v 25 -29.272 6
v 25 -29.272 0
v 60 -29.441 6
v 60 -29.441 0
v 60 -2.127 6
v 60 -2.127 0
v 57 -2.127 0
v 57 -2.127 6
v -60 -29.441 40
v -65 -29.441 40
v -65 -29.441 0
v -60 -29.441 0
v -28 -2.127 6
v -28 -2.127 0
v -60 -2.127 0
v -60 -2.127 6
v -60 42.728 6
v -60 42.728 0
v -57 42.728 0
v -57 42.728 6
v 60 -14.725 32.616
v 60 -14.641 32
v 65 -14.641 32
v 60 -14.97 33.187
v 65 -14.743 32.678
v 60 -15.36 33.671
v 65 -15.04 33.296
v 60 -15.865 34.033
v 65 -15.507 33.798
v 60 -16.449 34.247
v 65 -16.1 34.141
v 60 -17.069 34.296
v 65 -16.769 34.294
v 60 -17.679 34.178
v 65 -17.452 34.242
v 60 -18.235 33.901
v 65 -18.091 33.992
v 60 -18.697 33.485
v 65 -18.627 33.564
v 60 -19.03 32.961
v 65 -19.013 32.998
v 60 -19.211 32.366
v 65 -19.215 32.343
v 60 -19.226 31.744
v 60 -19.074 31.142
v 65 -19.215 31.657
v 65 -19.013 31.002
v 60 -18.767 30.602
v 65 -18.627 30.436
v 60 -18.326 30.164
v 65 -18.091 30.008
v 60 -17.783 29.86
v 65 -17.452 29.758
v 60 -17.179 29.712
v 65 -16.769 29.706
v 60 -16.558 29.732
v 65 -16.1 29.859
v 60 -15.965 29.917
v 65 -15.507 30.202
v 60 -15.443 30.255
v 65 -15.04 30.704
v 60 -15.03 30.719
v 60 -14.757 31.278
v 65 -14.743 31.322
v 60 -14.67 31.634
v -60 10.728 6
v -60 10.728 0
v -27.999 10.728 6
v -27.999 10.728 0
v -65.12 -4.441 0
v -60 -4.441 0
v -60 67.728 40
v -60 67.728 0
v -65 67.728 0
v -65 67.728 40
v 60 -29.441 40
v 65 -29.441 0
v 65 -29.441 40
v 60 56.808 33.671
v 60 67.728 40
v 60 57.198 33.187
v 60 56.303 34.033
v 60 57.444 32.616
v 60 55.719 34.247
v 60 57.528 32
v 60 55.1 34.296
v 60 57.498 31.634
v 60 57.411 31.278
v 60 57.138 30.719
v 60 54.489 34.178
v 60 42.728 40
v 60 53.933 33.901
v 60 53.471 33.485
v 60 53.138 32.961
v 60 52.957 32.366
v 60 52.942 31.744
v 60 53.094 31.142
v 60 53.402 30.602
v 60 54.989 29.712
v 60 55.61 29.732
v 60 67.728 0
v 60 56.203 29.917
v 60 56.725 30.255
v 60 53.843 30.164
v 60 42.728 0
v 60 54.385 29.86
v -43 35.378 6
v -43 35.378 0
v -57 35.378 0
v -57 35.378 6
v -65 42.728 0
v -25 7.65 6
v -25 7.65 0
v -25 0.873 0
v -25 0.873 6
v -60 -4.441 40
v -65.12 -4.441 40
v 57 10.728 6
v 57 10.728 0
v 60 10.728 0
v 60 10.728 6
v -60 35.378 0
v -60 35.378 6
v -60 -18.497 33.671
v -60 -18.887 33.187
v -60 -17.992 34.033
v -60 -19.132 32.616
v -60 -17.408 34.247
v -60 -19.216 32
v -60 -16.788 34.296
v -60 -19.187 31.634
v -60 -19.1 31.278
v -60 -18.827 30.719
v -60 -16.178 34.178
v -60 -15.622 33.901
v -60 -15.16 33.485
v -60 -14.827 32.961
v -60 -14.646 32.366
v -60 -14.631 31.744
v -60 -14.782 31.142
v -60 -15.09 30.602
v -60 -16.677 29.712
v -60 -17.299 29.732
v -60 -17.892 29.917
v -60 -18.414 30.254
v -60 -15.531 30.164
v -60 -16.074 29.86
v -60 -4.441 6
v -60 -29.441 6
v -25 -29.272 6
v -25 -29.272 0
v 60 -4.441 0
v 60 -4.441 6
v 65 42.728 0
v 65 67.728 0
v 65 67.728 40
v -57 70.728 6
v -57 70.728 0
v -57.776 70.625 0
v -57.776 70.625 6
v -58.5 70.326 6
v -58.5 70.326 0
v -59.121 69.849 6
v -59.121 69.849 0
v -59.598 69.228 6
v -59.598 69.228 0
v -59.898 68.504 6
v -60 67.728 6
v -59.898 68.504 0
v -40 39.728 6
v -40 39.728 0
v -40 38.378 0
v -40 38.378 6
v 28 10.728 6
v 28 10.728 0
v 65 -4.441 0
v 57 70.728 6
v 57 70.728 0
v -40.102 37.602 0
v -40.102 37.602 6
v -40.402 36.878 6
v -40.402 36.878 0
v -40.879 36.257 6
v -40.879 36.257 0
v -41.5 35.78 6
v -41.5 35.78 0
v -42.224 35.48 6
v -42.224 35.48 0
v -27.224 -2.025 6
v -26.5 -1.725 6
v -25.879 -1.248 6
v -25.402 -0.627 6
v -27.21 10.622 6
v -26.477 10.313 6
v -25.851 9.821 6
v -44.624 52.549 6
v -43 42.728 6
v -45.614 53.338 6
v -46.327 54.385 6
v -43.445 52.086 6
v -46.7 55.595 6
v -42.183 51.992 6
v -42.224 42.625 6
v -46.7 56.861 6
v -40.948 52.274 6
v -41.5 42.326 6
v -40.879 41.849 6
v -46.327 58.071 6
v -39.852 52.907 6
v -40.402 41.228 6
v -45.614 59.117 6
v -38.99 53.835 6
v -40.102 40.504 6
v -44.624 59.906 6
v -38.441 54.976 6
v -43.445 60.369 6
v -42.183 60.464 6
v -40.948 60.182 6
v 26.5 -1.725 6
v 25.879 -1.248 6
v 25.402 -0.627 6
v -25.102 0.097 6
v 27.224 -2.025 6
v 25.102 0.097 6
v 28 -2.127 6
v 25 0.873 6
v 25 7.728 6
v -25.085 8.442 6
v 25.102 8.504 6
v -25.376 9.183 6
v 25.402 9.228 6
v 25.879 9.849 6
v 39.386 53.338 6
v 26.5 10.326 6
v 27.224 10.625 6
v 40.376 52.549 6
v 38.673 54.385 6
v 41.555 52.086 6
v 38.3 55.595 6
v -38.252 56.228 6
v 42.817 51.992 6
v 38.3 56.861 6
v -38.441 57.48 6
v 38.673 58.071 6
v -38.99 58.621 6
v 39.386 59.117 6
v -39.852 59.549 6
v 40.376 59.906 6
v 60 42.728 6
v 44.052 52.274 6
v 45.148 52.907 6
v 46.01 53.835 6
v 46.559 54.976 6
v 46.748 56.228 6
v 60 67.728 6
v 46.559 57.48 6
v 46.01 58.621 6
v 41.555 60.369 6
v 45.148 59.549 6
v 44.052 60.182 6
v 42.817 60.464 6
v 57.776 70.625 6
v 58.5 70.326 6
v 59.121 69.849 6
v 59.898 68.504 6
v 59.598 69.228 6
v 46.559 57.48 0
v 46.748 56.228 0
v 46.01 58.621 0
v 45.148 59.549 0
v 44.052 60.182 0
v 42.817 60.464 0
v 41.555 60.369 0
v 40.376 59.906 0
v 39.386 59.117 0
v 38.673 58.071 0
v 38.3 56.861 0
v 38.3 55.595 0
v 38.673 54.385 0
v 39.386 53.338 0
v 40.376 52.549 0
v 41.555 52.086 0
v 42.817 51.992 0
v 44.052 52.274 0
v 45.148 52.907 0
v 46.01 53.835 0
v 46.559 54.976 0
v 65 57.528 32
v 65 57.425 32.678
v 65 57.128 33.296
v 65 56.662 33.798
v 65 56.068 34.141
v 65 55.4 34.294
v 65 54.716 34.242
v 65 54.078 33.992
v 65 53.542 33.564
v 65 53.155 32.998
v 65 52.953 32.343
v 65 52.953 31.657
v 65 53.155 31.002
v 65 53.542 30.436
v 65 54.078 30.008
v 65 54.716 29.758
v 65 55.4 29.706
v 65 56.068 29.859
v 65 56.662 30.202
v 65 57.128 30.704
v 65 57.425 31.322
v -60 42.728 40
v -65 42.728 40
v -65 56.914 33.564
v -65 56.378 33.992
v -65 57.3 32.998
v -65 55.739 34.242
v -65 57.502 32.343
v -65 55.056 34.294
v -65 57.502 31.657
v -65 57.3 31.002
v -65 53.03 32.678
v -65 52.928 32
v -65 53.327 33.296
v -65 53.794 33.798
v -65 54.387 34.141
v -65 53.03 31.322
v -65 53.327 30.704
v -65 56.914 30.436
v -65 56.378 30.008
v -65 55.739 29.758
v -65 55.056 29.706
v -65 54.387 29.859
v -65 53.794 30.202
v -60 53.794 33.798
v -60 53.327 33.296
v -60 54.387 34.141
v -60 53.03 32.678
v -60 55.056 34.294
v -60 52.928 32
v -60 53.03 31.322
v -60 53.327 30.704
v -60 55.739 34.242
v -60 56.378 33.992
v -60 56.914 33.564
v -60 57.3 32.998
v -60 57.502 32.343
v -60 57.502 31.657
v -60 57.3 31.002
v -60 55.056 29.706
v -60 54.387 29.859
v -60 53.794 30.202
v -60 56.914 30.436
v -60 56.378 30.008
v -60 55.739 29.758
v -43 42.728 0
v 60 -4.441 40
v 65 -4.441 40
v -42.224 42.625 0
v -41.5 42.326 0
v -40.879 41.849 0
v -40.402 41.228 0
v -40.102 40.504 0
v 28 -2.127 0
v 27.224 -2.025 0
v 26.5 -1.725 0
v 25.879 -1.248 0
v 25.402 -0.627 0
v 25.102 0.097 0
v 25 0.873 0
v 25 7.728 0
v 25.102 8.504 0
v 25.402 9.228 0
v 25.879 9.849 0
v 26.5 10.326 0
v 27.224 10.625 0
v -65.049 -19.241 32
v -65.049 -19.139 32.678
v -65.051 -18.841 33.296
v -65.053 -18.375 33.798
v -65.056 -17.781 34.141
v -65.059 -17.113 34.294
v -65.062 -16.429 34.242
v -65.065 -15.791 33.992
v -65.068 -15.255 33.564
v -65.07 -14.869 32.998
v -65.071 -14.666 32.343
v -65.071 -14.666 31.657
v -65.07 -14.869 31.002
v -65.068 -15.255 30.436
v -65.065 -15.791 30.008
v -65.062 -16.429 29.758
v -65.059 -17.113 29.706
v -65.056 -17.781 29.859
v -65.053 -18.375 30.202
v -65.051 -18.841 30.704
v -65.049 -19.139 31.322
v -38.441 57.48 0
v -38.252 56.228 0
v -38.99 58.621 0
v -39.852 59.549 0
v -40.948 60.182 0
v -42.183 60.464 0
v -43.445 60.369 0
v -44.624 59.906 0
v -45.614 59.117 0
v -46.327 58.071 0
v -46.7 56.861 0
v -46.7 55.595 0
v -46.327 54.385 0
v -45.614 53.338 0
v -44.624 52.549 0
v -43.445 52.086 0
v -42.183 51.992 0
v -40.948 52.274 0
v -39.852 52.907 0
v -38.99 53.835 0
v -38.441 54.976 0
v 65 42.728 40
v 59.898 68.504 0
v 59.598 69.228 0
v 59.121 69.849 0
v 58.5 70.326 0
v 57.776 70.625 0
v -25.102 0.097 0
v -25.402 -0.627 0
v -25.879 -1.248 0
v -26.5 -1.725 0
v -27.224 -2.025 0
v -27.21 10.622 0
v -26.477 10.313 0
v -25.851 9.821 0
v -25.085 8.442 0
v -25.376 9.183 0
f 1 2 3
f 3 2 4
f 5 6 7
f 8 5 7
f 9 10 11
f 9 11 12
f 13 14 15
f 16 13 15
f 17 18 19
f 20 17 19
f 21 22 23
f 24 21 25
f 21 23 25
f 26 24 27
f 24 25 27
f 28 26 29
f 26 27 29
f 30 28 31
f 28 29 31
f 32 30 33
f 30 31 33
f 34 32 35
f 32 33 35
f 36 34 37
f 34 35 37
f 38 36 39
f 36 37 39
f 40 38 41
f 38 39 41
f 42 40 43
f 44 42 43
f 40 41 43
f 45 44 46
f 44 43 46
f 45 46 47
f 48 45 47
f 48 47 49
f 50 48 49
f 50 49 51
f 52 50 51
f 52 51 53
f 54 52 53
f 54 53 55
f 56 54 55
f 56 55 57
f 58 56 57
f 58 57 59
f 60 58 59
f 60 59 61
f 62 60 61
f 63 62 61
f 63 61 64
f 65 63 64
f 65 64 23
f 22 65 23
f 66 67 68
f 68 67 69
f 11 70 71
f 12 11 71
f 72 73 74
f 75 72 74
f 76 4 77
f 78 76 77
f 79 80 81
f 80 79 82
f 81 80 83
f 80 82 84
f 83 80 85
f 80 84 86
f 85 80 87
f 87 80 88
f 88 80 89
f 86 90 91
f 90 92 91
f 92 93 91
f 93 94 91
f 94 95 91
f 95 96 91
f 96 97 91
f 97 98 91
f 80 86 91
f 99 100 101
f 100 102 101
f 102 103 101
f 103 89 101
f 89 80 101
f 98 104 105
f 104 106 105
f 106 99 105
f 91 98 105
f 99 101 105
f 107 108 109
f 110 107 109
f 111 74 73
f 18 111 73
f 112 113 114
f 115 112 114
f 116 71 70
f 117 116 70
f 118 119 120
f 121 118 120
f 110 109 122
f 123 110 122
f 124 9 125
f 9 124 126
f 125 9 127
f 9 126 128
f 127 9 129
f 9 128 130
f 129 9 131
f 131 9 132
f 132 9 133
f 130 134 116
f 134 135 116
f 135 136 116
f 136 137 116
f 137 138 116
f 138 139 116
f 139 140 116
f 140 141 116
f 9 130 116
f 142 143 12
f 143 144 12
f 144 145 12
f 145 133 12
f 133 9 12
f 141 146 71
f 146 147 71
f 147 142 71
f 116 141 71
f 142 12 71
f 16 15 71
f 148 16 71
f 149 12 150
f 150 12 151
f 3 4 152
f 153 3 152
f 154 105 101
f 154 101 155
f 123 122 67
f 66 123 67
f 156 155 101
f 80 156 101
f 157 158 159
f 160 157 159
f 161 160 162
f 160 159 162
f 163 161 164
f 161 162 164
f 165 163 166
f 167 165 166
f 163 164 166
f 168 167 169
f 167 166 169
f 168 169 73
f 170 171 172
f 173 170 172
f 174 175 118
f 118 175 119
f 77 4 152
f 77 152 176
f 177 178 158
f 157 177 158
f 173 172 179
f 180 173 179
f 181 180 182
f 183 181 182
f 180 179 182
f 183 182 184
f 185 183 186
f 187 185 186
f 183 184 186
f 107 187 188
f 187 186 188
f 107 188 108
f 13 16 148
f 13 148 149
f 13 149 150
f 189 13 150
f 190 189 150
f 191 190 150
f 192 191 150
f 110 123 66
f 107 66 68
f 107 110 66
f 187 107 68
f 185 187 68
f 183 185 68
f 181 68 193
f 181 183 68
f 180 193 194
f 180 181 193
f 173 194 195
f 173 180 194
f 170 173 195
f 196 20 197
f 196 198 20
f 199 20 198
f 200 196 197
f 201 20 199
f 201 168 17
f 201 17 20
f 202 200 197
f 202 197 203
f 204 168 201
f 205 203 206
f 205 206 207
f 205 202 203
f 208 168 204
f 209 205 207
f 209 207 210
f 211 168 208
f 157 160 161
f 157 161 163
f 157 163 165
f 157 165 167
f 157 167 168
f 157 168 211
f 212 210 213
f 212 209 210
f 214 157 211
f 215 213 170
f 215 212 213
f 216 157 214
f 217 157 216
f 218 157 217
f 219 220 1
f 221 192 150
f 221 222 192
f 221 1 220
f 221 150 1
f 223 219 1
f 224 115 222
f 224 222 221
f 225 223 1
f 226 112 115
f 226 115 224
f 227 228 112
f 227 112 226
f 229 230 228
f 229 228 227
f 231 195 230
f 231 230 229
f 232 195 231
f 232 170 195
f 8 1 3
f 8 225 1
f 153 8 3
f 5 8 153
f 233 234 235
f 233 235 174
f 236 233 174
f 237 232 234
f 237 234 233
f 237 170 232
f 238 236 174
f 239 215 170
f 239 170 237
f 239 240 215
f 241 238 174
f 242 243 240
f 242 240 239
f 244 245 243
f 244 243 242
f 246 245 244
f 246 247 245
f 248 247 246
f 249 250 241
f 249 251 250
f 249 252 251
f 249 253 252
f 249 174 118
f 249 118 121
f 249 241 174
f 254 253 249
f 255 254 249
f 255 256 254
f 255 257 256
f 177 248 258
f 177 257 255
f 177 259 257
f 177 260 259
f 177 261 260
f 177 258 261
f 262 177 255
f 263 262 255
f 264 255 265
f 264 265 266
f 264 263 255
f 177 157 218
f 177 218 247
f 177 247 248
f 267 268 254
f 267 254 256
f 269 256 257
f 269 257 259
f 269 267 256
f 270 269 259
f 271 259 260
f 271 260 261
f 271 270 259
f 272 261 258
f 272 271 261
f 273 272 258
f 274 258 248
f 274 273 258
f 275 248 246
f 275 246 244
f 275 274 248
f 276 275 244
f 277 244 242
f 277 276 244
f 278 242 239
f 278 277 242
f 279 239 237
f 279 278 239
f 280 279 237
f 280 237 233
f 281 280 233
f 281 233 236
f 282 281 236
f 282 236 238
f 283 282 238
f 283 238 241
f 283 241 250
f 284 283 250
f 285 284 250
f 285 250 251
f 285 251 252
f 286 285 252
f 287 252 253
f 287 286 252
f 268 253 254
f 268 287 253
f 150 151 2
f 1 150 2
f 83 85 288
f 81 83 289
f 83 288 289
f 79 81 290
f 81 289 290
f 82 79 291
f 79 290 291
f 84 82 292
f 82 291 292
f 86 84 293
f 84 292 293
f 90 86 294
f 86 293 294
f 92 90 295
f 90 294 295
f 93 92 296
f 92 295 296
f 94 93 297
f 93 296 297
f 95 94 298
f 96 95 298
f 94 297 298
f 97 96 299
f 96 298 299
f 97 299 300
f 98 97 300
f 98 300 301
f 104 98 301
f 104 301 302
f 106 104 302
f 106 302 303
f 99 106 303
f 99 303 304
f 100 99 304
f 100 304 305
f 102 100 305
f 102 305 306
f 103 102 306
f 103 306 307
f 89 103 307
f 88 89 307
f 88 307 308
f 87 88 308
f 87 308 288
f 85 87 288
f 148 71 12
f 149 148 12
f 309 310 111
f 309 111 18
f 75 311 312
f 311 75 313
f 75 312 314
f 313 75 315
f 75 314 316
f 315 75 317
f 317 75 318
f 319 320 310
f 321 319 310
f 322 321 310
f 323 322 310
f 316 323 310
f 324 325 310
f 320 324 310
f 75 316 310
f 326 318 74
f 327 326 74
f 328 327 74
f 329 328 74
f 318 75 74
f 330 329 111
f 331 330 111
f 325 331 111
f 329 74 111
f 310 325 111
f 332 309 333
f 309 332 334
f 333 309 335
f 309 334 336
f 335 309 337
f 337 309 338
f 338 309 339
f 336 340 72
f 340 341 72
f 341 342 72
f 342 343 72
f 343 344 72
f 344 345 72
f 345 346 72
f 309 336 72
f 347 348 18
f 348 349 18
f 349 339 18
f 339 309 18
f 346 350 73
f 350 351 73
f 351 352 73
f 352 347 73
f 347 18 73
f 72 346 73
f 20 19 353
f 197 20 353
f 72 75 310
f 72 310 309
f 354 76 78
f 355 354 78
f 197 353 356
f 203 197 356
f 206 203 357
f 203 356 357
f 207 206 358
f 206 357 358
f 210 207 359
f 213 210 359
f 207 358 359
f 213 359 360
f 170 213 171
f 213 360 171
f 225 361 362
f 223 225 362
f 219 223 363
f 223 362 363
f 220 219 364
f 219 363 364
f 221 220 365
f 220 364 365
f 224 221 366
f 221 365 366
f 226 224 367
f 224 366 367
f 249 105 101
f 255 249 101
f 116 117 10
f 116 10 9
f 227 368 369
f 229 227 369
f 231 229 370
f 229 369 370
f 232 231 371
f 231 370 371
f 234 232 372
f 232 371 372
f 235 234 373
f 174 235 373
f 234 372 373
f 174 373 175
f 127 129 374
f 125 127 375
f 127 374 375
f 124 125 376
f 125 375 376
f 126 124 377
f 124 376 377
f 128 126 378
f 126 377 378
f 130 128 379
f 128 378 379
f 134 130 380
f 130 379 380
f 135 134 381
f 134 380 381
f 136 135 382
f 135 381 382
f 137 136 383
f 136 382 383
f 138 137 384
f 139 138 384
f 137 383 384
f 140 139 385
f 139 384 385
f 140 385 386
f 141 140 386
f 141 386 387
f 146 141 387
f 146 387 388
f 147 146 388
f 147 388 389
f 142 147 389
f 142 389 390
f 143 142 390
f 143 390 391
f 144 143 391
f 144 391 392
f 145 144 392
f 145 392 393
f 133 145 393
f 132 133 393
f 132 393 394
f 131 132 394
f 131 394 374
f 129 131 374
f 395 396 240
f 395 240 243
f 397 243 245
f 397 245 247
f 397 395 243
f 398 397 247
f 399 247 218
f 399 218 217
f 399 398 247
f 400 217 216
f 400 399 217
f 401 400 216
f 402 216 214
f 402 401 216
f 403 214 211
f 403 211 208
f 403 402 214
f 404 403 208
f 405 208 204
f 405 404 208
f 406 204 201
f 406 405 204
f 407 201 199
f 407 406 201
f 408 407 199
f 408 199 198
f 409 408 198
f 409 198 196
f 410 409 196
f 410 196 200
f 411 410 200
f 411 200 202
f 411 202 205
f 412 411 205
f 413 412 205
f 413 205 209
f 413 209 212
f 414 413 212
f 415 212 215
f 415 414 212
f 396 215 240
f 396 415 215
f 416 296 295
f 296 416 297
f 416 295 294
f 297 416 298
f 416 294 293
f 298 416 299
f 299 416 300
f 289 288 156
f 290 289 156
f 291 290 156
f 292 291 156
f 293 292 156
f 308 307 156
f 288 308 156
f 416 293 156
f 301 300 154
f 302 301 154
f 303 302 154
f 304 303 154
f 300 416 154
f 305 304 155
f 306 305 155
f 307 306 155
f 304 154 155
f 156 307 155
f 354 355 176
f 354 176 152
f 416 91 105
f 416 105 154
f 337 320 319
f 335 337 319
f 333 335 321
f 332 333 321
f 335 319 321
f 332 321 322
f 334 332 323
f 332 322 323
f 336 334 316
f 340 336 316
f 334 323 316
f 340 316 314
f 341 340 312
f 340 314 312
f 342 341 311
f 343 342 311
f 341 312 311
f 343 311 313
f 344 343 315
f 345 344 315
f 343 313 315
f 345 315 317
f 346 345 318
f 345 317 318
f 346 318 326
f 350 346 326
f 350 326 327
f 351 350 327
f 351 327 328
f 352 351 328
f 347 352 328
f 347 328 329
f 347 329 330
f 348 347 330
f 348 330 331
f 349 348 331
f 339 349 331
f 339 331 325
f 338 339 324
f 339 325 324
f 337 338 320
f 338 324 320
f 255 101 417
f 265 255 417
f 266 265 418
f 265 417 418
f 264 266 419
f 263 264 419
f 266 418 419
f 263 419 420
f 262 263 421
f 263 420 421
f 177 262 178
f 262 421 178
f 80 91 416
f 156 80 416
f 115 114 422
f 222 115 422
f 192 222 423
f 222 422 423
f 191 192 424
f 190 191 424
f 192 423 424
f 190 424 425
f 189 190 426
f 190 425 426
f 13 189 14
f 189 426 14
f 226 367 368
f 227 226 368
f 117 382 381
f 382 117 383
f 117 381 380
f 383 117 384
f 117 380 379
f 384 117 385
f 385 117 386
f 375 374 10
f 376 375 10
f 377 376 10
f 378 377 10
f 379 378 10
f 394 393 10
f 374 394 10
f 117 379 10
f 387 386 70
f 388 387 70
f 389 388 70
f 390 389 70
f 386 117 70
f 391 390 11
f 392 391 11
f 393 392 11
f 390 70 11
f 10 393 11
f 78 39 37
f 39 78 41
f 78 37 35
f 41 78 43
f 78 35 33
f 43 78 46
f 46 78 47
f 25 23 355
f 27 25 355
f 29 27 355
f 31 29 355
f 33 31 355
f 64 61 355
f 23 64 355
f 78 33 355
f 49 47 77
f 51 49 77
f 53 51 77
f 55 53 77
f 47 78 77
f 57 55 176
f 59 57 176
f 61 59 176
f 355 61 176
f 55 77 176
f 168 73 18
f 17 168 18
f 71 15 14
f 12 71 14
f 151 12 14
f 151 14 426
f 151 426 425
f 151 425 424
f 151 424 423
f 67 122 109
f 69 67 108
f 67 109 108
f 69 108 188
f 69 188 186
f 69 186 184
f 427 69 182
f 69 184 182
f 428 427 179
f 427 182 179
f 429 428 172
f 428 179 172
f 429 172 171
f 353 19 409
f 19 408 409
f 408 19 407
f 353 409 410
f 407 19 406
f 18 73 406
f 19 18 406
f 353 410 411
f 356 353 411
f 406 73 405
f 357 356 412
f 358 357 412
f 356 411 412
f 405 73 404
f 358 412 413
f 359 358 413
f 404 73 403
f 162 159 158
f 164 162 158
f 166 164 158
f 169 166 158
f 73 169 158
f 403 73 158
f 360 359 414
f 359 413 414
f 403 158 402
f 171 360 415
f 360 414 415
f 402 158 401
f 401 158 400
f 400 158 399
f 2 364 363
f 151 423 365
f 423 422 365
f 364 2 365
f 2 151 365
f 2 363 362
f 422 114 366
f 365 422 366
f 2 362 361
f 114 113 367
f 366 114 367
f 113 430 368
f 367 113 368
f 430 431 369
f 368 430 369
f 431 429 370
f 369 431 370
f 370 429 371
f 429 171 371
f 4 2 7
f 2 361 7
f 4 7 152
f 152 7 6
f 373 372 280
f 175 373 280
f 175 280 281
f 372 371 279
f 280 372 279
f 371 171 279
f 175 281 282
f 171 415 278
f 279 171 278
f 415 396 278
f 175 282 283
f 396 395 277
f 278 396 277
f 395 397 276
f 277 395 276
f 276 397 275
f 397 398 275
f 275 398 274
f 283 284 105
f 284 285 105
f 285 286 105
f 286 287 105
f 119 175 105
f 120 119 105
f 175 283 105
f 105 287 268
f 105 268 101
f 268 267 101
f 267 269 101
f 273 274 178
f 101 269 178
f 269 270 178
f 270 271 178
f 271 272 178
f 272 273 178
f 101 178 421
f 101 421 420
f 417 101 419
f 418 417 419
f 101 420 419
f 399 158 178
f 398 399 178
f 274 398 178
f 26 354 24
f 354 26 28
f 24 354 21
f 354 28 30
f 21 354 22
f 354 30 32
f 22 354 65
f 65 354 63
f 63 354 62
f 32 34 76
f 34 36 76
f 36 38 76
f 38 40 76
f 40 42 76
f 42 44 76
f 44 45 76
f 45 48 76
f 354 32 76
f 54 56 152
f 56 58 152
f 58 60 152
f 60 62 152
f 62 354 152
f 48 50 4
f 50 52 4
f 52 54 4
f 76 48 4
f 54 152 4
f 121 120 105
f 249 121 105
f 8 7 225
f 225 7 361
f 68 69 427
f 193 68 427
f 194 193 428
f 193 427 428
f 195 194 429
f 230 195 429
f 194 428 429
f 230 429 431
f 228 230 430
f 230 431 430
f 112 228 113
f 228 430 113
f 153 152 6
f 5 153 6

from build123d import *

# Parameters (mm, degrees)
F1_DEPTH  = 40
F0_R      = 4.2477627918
F2_DEPTH  = 6
F3_R      = 2.3
F4_DEPTH  = 5
F5_R      = 2.3
F6_DEPTH  = 6
F7_R      = 2.3
F8_DEPTH  = 6
F9_R      = 2.3
F10_DEPTH = 6


# Not quite as in the source:
# - ends of sketch curves that miss each other by under 0.0002 mm in the source are joined
# - a feature names something its author has since deleted; it is built from what else it names


with BuildPart() as f1:
    # F0 (on Top) → F1 (new body)
    with BuildSketch(Plane.XY):
        Polygon((64.9996812557, -4.4405678571), (59.9996996739, -4.4405506629), (59.999595637, -29.4405678569), (64.9995952845, -29.4405678569), align=None)
    extrude(amount=F1_DEPTH)

    # F7 (on face) → F8 (cut)
    with BuildSketch(Plane(origin=(64.9996965254, -0.0002235242, 0), x_dir=(3.4388e-06, 1, 0), z_dir=(1, -3.4388e-06, 0))):
        with Locations((-16.9403443329, 32)):
            Circle(F7_R)
    extrude(amount=-F8_DEPTH, mode=Mode.SUBTRACT)


with BuildPart() as f1b:
    # F0 (on Top) → F1, piece 2 (new body)
    with BuildSketch(Plane.XY):
        Polygon((65.0000812269, 67.727673769), (60, 67.727673769), (59.9998959633, 42.7276945771), (65.0000812269, 42.727673769), align=None)
    extrude(amount=F1_DEPTH)

    # F9 (on face) → F10 (cut)
    with BuildSketch(Plane.YZ.offset(65.0000812269)):
        with Locations((55.227673769, 32)):
            Circle(F9_R)
    extrude(amount=-F10_DEPTH, mode=Mode.SUBTRACT)


with BuildPart() as f1c:
    # F0 (on Top) → F1, piece 3 (new body)
    with BuildSketch(Plane.XY):
        Polygon((-59.9998959632, 42.7276737692), (-60, 67.727673769), (-65, 67.7276529616), (-64.9998959631, 42.7276529619), align=None)
    extrude(amount=F1_DEPTH)

    # F3 (on face) → F4 (cut)
    with BuildSketch(Plane(origin=(-64.9997181521, -0.0002704945, 0), x_dir=(4.1615e-06, -1, 0), z_dir=(-1, -4.1615e-06, 0))):
        with Locations((-55.2279234568, 32)):
            Circle(F3_R)
    extrude(amount=-F4_DEPTH, mode=Mode.SUBTRACT)


with BuildPart() as f1d:
    # F0 (on Top) → F1, piece 4 (new body)
    with BuildSketch(Plane.XY):
        Polygon((-59.999595637, -29.4405678569), (-59.9996996726, -4.4408566876), (-65.119768227, -4.4408566876), (-64.999595637, -29.4405678569), align=None)
    extrude(amount=F1_DEPTH)

    # F5 (on face) → F6 (cut)
    with BuildSketch(Plane(origin=(-65.139610072, -0.3131234436, 0), x_dir=(0.0048069036, -0.9999884468, 0), z_dir=(-0.9999884468, -0.0048069036, 0))):
        with Locations((16.6277809332, 32)):
            Circle(F5_R)
    extrude(amount=-F6_DEPTH, mode=Mode.SUBTRACT)


with BuildPart() as f2:
    # F0 (on Top) → F2 (new body)
    with BuildSketch(Plane.XY):
        with BuildLine():
            Line((57, 70.727673769), (0, 70.727673769))
            Line((0, 70.727673769), (-57, 70.727673769))
            ThreePointArc((-57, 70.727673769), (-59.1213203436, 69.8489941126), (-60, 67.727673769))
            Line((-60, 67.727673769), (-59.9998959632, 42.7276737692))
            Line((-59.9998959632, 42.7276737692), (-56.9999663575, 42.7276542423))
            Line((-56.9999663575, 42.7276542423), (-43, 42.727656483))
            Line((-43, 42.727656483), (59.9998959633, 42.7276729687))
            Line((59.9998959633, 42.7276729687), (60, 67.727673769))
            ThreePointArc((60, 67.727673769), (59.1213203436, 69.8489941126), (57, 70.727673769))
        make_face()
        with Locations((-42.5, 56.227673769)):
            Circle(F0_R, mode=Mode.SUBTRACT)
        with Locations((42.5, 56.227673769)):
            Circle(F0_R, mode=Mode.SUBTRACT)
        with BuildLine():
            Line((59.9997627961, 10.7276737687), (59.9998959633, 42.7276945771))
            Line((59.9998959633, 42.7276945771), (-43, 42.727656483))
            ThreePointArc((-43, 42.727656483), (-40.8786796564, 41.8489941126), (-40, 39.727673769))
            Line((-40, 39.727673769), (-40, 38.378118492))
            ThreePointArc((-40, 38.378118492), (-40.8786796564, 36.2567981484), (-43, 35.378118492))
            Line((-43, 35.378118492), (-56.9999512234, 35.378118492))
            Line((-56.9999512234, 35.378118492), (-59.9998653782, 35.3781060079))
            Line((-59.9998653782, 35.3781060079), (-59.9997627961, 10.727673769))
            Line((-59.9997627961, 10.727673769), (-57, 10.727673769))
            Line((-57, 10.727673769), (-27.9990918762, 10.727673769))
            ThreePointArc((-27.9990918762, 10.727673769), (-25.850534475, 9.8214027614), (-25.0000939277, 7.6501411647))
            Line((-25.0000939277, 7.6501411647), (-25.0000939277, 0.8731241727))
            ThreePointArc((-25.0000939277, 0.8731241727), (-25.8787735841, -1.2481961709), (-28.0000939277, -2.1268758273))
            Line((-28.0000939277, -2.1268758273), (-56.9996895647, -2.1268758273))
            Line((-56.9996895647, -2.1268758273), (-59.9996895647, -2.1268758273))
            Line((-59.9996895647, -2.1268758273), (-59.9996996726, -4.4408566876))
            Line((-59.9996996726, -4.4408566876), (-59.999595637, -29.4405678569))
            Line((-59.999595637, -29.4405678569), (-25, -29.272326231))
            Line((-25, -29.272326231), (0, -29.272326231))
            Line((0, -29.272326231), (25, -29.272326231))
            Line((25, -29.272326231), (59.999595637, -29.4405678569))
            Line((59.999595637, -29.4405678569), (59.9996996739, -4.4405506629))
            Line((59.9996996739, -4.4405506629), (59.9997093022, -2.1268758274))
            Line((59.9997093022, -2.1268758274), (56.9996895647, -2.1268655108))
            Line((56.9996895647, -2.1268655108), (27.9999896835, -2.1267657852))
            ThreePointArc((27.9999896835, -2.1267657852), (25.878676009, -1.2480824813), (25, 0.8732342148))
            Line((25, 0.8732342148), (25, 7.727673769))
            ThreePointArc((25, 7.727673769), (25.8786796564, 9.8489941126), (28, 10.727673769))
            Line((28, 10.727673769), (37, 10.727673769))
            Line((37, 10.727673769), (56.9996895647, 10.727673769))
            Line((56.9996895647, 10.727673769), (59.9997627961, 10.7276737687))
        make_face()
    extrude(amount=F2_DEPTH)


solid = Compound([f1.part, f1b.part, f1c.part, f1d.part, f2.part])
